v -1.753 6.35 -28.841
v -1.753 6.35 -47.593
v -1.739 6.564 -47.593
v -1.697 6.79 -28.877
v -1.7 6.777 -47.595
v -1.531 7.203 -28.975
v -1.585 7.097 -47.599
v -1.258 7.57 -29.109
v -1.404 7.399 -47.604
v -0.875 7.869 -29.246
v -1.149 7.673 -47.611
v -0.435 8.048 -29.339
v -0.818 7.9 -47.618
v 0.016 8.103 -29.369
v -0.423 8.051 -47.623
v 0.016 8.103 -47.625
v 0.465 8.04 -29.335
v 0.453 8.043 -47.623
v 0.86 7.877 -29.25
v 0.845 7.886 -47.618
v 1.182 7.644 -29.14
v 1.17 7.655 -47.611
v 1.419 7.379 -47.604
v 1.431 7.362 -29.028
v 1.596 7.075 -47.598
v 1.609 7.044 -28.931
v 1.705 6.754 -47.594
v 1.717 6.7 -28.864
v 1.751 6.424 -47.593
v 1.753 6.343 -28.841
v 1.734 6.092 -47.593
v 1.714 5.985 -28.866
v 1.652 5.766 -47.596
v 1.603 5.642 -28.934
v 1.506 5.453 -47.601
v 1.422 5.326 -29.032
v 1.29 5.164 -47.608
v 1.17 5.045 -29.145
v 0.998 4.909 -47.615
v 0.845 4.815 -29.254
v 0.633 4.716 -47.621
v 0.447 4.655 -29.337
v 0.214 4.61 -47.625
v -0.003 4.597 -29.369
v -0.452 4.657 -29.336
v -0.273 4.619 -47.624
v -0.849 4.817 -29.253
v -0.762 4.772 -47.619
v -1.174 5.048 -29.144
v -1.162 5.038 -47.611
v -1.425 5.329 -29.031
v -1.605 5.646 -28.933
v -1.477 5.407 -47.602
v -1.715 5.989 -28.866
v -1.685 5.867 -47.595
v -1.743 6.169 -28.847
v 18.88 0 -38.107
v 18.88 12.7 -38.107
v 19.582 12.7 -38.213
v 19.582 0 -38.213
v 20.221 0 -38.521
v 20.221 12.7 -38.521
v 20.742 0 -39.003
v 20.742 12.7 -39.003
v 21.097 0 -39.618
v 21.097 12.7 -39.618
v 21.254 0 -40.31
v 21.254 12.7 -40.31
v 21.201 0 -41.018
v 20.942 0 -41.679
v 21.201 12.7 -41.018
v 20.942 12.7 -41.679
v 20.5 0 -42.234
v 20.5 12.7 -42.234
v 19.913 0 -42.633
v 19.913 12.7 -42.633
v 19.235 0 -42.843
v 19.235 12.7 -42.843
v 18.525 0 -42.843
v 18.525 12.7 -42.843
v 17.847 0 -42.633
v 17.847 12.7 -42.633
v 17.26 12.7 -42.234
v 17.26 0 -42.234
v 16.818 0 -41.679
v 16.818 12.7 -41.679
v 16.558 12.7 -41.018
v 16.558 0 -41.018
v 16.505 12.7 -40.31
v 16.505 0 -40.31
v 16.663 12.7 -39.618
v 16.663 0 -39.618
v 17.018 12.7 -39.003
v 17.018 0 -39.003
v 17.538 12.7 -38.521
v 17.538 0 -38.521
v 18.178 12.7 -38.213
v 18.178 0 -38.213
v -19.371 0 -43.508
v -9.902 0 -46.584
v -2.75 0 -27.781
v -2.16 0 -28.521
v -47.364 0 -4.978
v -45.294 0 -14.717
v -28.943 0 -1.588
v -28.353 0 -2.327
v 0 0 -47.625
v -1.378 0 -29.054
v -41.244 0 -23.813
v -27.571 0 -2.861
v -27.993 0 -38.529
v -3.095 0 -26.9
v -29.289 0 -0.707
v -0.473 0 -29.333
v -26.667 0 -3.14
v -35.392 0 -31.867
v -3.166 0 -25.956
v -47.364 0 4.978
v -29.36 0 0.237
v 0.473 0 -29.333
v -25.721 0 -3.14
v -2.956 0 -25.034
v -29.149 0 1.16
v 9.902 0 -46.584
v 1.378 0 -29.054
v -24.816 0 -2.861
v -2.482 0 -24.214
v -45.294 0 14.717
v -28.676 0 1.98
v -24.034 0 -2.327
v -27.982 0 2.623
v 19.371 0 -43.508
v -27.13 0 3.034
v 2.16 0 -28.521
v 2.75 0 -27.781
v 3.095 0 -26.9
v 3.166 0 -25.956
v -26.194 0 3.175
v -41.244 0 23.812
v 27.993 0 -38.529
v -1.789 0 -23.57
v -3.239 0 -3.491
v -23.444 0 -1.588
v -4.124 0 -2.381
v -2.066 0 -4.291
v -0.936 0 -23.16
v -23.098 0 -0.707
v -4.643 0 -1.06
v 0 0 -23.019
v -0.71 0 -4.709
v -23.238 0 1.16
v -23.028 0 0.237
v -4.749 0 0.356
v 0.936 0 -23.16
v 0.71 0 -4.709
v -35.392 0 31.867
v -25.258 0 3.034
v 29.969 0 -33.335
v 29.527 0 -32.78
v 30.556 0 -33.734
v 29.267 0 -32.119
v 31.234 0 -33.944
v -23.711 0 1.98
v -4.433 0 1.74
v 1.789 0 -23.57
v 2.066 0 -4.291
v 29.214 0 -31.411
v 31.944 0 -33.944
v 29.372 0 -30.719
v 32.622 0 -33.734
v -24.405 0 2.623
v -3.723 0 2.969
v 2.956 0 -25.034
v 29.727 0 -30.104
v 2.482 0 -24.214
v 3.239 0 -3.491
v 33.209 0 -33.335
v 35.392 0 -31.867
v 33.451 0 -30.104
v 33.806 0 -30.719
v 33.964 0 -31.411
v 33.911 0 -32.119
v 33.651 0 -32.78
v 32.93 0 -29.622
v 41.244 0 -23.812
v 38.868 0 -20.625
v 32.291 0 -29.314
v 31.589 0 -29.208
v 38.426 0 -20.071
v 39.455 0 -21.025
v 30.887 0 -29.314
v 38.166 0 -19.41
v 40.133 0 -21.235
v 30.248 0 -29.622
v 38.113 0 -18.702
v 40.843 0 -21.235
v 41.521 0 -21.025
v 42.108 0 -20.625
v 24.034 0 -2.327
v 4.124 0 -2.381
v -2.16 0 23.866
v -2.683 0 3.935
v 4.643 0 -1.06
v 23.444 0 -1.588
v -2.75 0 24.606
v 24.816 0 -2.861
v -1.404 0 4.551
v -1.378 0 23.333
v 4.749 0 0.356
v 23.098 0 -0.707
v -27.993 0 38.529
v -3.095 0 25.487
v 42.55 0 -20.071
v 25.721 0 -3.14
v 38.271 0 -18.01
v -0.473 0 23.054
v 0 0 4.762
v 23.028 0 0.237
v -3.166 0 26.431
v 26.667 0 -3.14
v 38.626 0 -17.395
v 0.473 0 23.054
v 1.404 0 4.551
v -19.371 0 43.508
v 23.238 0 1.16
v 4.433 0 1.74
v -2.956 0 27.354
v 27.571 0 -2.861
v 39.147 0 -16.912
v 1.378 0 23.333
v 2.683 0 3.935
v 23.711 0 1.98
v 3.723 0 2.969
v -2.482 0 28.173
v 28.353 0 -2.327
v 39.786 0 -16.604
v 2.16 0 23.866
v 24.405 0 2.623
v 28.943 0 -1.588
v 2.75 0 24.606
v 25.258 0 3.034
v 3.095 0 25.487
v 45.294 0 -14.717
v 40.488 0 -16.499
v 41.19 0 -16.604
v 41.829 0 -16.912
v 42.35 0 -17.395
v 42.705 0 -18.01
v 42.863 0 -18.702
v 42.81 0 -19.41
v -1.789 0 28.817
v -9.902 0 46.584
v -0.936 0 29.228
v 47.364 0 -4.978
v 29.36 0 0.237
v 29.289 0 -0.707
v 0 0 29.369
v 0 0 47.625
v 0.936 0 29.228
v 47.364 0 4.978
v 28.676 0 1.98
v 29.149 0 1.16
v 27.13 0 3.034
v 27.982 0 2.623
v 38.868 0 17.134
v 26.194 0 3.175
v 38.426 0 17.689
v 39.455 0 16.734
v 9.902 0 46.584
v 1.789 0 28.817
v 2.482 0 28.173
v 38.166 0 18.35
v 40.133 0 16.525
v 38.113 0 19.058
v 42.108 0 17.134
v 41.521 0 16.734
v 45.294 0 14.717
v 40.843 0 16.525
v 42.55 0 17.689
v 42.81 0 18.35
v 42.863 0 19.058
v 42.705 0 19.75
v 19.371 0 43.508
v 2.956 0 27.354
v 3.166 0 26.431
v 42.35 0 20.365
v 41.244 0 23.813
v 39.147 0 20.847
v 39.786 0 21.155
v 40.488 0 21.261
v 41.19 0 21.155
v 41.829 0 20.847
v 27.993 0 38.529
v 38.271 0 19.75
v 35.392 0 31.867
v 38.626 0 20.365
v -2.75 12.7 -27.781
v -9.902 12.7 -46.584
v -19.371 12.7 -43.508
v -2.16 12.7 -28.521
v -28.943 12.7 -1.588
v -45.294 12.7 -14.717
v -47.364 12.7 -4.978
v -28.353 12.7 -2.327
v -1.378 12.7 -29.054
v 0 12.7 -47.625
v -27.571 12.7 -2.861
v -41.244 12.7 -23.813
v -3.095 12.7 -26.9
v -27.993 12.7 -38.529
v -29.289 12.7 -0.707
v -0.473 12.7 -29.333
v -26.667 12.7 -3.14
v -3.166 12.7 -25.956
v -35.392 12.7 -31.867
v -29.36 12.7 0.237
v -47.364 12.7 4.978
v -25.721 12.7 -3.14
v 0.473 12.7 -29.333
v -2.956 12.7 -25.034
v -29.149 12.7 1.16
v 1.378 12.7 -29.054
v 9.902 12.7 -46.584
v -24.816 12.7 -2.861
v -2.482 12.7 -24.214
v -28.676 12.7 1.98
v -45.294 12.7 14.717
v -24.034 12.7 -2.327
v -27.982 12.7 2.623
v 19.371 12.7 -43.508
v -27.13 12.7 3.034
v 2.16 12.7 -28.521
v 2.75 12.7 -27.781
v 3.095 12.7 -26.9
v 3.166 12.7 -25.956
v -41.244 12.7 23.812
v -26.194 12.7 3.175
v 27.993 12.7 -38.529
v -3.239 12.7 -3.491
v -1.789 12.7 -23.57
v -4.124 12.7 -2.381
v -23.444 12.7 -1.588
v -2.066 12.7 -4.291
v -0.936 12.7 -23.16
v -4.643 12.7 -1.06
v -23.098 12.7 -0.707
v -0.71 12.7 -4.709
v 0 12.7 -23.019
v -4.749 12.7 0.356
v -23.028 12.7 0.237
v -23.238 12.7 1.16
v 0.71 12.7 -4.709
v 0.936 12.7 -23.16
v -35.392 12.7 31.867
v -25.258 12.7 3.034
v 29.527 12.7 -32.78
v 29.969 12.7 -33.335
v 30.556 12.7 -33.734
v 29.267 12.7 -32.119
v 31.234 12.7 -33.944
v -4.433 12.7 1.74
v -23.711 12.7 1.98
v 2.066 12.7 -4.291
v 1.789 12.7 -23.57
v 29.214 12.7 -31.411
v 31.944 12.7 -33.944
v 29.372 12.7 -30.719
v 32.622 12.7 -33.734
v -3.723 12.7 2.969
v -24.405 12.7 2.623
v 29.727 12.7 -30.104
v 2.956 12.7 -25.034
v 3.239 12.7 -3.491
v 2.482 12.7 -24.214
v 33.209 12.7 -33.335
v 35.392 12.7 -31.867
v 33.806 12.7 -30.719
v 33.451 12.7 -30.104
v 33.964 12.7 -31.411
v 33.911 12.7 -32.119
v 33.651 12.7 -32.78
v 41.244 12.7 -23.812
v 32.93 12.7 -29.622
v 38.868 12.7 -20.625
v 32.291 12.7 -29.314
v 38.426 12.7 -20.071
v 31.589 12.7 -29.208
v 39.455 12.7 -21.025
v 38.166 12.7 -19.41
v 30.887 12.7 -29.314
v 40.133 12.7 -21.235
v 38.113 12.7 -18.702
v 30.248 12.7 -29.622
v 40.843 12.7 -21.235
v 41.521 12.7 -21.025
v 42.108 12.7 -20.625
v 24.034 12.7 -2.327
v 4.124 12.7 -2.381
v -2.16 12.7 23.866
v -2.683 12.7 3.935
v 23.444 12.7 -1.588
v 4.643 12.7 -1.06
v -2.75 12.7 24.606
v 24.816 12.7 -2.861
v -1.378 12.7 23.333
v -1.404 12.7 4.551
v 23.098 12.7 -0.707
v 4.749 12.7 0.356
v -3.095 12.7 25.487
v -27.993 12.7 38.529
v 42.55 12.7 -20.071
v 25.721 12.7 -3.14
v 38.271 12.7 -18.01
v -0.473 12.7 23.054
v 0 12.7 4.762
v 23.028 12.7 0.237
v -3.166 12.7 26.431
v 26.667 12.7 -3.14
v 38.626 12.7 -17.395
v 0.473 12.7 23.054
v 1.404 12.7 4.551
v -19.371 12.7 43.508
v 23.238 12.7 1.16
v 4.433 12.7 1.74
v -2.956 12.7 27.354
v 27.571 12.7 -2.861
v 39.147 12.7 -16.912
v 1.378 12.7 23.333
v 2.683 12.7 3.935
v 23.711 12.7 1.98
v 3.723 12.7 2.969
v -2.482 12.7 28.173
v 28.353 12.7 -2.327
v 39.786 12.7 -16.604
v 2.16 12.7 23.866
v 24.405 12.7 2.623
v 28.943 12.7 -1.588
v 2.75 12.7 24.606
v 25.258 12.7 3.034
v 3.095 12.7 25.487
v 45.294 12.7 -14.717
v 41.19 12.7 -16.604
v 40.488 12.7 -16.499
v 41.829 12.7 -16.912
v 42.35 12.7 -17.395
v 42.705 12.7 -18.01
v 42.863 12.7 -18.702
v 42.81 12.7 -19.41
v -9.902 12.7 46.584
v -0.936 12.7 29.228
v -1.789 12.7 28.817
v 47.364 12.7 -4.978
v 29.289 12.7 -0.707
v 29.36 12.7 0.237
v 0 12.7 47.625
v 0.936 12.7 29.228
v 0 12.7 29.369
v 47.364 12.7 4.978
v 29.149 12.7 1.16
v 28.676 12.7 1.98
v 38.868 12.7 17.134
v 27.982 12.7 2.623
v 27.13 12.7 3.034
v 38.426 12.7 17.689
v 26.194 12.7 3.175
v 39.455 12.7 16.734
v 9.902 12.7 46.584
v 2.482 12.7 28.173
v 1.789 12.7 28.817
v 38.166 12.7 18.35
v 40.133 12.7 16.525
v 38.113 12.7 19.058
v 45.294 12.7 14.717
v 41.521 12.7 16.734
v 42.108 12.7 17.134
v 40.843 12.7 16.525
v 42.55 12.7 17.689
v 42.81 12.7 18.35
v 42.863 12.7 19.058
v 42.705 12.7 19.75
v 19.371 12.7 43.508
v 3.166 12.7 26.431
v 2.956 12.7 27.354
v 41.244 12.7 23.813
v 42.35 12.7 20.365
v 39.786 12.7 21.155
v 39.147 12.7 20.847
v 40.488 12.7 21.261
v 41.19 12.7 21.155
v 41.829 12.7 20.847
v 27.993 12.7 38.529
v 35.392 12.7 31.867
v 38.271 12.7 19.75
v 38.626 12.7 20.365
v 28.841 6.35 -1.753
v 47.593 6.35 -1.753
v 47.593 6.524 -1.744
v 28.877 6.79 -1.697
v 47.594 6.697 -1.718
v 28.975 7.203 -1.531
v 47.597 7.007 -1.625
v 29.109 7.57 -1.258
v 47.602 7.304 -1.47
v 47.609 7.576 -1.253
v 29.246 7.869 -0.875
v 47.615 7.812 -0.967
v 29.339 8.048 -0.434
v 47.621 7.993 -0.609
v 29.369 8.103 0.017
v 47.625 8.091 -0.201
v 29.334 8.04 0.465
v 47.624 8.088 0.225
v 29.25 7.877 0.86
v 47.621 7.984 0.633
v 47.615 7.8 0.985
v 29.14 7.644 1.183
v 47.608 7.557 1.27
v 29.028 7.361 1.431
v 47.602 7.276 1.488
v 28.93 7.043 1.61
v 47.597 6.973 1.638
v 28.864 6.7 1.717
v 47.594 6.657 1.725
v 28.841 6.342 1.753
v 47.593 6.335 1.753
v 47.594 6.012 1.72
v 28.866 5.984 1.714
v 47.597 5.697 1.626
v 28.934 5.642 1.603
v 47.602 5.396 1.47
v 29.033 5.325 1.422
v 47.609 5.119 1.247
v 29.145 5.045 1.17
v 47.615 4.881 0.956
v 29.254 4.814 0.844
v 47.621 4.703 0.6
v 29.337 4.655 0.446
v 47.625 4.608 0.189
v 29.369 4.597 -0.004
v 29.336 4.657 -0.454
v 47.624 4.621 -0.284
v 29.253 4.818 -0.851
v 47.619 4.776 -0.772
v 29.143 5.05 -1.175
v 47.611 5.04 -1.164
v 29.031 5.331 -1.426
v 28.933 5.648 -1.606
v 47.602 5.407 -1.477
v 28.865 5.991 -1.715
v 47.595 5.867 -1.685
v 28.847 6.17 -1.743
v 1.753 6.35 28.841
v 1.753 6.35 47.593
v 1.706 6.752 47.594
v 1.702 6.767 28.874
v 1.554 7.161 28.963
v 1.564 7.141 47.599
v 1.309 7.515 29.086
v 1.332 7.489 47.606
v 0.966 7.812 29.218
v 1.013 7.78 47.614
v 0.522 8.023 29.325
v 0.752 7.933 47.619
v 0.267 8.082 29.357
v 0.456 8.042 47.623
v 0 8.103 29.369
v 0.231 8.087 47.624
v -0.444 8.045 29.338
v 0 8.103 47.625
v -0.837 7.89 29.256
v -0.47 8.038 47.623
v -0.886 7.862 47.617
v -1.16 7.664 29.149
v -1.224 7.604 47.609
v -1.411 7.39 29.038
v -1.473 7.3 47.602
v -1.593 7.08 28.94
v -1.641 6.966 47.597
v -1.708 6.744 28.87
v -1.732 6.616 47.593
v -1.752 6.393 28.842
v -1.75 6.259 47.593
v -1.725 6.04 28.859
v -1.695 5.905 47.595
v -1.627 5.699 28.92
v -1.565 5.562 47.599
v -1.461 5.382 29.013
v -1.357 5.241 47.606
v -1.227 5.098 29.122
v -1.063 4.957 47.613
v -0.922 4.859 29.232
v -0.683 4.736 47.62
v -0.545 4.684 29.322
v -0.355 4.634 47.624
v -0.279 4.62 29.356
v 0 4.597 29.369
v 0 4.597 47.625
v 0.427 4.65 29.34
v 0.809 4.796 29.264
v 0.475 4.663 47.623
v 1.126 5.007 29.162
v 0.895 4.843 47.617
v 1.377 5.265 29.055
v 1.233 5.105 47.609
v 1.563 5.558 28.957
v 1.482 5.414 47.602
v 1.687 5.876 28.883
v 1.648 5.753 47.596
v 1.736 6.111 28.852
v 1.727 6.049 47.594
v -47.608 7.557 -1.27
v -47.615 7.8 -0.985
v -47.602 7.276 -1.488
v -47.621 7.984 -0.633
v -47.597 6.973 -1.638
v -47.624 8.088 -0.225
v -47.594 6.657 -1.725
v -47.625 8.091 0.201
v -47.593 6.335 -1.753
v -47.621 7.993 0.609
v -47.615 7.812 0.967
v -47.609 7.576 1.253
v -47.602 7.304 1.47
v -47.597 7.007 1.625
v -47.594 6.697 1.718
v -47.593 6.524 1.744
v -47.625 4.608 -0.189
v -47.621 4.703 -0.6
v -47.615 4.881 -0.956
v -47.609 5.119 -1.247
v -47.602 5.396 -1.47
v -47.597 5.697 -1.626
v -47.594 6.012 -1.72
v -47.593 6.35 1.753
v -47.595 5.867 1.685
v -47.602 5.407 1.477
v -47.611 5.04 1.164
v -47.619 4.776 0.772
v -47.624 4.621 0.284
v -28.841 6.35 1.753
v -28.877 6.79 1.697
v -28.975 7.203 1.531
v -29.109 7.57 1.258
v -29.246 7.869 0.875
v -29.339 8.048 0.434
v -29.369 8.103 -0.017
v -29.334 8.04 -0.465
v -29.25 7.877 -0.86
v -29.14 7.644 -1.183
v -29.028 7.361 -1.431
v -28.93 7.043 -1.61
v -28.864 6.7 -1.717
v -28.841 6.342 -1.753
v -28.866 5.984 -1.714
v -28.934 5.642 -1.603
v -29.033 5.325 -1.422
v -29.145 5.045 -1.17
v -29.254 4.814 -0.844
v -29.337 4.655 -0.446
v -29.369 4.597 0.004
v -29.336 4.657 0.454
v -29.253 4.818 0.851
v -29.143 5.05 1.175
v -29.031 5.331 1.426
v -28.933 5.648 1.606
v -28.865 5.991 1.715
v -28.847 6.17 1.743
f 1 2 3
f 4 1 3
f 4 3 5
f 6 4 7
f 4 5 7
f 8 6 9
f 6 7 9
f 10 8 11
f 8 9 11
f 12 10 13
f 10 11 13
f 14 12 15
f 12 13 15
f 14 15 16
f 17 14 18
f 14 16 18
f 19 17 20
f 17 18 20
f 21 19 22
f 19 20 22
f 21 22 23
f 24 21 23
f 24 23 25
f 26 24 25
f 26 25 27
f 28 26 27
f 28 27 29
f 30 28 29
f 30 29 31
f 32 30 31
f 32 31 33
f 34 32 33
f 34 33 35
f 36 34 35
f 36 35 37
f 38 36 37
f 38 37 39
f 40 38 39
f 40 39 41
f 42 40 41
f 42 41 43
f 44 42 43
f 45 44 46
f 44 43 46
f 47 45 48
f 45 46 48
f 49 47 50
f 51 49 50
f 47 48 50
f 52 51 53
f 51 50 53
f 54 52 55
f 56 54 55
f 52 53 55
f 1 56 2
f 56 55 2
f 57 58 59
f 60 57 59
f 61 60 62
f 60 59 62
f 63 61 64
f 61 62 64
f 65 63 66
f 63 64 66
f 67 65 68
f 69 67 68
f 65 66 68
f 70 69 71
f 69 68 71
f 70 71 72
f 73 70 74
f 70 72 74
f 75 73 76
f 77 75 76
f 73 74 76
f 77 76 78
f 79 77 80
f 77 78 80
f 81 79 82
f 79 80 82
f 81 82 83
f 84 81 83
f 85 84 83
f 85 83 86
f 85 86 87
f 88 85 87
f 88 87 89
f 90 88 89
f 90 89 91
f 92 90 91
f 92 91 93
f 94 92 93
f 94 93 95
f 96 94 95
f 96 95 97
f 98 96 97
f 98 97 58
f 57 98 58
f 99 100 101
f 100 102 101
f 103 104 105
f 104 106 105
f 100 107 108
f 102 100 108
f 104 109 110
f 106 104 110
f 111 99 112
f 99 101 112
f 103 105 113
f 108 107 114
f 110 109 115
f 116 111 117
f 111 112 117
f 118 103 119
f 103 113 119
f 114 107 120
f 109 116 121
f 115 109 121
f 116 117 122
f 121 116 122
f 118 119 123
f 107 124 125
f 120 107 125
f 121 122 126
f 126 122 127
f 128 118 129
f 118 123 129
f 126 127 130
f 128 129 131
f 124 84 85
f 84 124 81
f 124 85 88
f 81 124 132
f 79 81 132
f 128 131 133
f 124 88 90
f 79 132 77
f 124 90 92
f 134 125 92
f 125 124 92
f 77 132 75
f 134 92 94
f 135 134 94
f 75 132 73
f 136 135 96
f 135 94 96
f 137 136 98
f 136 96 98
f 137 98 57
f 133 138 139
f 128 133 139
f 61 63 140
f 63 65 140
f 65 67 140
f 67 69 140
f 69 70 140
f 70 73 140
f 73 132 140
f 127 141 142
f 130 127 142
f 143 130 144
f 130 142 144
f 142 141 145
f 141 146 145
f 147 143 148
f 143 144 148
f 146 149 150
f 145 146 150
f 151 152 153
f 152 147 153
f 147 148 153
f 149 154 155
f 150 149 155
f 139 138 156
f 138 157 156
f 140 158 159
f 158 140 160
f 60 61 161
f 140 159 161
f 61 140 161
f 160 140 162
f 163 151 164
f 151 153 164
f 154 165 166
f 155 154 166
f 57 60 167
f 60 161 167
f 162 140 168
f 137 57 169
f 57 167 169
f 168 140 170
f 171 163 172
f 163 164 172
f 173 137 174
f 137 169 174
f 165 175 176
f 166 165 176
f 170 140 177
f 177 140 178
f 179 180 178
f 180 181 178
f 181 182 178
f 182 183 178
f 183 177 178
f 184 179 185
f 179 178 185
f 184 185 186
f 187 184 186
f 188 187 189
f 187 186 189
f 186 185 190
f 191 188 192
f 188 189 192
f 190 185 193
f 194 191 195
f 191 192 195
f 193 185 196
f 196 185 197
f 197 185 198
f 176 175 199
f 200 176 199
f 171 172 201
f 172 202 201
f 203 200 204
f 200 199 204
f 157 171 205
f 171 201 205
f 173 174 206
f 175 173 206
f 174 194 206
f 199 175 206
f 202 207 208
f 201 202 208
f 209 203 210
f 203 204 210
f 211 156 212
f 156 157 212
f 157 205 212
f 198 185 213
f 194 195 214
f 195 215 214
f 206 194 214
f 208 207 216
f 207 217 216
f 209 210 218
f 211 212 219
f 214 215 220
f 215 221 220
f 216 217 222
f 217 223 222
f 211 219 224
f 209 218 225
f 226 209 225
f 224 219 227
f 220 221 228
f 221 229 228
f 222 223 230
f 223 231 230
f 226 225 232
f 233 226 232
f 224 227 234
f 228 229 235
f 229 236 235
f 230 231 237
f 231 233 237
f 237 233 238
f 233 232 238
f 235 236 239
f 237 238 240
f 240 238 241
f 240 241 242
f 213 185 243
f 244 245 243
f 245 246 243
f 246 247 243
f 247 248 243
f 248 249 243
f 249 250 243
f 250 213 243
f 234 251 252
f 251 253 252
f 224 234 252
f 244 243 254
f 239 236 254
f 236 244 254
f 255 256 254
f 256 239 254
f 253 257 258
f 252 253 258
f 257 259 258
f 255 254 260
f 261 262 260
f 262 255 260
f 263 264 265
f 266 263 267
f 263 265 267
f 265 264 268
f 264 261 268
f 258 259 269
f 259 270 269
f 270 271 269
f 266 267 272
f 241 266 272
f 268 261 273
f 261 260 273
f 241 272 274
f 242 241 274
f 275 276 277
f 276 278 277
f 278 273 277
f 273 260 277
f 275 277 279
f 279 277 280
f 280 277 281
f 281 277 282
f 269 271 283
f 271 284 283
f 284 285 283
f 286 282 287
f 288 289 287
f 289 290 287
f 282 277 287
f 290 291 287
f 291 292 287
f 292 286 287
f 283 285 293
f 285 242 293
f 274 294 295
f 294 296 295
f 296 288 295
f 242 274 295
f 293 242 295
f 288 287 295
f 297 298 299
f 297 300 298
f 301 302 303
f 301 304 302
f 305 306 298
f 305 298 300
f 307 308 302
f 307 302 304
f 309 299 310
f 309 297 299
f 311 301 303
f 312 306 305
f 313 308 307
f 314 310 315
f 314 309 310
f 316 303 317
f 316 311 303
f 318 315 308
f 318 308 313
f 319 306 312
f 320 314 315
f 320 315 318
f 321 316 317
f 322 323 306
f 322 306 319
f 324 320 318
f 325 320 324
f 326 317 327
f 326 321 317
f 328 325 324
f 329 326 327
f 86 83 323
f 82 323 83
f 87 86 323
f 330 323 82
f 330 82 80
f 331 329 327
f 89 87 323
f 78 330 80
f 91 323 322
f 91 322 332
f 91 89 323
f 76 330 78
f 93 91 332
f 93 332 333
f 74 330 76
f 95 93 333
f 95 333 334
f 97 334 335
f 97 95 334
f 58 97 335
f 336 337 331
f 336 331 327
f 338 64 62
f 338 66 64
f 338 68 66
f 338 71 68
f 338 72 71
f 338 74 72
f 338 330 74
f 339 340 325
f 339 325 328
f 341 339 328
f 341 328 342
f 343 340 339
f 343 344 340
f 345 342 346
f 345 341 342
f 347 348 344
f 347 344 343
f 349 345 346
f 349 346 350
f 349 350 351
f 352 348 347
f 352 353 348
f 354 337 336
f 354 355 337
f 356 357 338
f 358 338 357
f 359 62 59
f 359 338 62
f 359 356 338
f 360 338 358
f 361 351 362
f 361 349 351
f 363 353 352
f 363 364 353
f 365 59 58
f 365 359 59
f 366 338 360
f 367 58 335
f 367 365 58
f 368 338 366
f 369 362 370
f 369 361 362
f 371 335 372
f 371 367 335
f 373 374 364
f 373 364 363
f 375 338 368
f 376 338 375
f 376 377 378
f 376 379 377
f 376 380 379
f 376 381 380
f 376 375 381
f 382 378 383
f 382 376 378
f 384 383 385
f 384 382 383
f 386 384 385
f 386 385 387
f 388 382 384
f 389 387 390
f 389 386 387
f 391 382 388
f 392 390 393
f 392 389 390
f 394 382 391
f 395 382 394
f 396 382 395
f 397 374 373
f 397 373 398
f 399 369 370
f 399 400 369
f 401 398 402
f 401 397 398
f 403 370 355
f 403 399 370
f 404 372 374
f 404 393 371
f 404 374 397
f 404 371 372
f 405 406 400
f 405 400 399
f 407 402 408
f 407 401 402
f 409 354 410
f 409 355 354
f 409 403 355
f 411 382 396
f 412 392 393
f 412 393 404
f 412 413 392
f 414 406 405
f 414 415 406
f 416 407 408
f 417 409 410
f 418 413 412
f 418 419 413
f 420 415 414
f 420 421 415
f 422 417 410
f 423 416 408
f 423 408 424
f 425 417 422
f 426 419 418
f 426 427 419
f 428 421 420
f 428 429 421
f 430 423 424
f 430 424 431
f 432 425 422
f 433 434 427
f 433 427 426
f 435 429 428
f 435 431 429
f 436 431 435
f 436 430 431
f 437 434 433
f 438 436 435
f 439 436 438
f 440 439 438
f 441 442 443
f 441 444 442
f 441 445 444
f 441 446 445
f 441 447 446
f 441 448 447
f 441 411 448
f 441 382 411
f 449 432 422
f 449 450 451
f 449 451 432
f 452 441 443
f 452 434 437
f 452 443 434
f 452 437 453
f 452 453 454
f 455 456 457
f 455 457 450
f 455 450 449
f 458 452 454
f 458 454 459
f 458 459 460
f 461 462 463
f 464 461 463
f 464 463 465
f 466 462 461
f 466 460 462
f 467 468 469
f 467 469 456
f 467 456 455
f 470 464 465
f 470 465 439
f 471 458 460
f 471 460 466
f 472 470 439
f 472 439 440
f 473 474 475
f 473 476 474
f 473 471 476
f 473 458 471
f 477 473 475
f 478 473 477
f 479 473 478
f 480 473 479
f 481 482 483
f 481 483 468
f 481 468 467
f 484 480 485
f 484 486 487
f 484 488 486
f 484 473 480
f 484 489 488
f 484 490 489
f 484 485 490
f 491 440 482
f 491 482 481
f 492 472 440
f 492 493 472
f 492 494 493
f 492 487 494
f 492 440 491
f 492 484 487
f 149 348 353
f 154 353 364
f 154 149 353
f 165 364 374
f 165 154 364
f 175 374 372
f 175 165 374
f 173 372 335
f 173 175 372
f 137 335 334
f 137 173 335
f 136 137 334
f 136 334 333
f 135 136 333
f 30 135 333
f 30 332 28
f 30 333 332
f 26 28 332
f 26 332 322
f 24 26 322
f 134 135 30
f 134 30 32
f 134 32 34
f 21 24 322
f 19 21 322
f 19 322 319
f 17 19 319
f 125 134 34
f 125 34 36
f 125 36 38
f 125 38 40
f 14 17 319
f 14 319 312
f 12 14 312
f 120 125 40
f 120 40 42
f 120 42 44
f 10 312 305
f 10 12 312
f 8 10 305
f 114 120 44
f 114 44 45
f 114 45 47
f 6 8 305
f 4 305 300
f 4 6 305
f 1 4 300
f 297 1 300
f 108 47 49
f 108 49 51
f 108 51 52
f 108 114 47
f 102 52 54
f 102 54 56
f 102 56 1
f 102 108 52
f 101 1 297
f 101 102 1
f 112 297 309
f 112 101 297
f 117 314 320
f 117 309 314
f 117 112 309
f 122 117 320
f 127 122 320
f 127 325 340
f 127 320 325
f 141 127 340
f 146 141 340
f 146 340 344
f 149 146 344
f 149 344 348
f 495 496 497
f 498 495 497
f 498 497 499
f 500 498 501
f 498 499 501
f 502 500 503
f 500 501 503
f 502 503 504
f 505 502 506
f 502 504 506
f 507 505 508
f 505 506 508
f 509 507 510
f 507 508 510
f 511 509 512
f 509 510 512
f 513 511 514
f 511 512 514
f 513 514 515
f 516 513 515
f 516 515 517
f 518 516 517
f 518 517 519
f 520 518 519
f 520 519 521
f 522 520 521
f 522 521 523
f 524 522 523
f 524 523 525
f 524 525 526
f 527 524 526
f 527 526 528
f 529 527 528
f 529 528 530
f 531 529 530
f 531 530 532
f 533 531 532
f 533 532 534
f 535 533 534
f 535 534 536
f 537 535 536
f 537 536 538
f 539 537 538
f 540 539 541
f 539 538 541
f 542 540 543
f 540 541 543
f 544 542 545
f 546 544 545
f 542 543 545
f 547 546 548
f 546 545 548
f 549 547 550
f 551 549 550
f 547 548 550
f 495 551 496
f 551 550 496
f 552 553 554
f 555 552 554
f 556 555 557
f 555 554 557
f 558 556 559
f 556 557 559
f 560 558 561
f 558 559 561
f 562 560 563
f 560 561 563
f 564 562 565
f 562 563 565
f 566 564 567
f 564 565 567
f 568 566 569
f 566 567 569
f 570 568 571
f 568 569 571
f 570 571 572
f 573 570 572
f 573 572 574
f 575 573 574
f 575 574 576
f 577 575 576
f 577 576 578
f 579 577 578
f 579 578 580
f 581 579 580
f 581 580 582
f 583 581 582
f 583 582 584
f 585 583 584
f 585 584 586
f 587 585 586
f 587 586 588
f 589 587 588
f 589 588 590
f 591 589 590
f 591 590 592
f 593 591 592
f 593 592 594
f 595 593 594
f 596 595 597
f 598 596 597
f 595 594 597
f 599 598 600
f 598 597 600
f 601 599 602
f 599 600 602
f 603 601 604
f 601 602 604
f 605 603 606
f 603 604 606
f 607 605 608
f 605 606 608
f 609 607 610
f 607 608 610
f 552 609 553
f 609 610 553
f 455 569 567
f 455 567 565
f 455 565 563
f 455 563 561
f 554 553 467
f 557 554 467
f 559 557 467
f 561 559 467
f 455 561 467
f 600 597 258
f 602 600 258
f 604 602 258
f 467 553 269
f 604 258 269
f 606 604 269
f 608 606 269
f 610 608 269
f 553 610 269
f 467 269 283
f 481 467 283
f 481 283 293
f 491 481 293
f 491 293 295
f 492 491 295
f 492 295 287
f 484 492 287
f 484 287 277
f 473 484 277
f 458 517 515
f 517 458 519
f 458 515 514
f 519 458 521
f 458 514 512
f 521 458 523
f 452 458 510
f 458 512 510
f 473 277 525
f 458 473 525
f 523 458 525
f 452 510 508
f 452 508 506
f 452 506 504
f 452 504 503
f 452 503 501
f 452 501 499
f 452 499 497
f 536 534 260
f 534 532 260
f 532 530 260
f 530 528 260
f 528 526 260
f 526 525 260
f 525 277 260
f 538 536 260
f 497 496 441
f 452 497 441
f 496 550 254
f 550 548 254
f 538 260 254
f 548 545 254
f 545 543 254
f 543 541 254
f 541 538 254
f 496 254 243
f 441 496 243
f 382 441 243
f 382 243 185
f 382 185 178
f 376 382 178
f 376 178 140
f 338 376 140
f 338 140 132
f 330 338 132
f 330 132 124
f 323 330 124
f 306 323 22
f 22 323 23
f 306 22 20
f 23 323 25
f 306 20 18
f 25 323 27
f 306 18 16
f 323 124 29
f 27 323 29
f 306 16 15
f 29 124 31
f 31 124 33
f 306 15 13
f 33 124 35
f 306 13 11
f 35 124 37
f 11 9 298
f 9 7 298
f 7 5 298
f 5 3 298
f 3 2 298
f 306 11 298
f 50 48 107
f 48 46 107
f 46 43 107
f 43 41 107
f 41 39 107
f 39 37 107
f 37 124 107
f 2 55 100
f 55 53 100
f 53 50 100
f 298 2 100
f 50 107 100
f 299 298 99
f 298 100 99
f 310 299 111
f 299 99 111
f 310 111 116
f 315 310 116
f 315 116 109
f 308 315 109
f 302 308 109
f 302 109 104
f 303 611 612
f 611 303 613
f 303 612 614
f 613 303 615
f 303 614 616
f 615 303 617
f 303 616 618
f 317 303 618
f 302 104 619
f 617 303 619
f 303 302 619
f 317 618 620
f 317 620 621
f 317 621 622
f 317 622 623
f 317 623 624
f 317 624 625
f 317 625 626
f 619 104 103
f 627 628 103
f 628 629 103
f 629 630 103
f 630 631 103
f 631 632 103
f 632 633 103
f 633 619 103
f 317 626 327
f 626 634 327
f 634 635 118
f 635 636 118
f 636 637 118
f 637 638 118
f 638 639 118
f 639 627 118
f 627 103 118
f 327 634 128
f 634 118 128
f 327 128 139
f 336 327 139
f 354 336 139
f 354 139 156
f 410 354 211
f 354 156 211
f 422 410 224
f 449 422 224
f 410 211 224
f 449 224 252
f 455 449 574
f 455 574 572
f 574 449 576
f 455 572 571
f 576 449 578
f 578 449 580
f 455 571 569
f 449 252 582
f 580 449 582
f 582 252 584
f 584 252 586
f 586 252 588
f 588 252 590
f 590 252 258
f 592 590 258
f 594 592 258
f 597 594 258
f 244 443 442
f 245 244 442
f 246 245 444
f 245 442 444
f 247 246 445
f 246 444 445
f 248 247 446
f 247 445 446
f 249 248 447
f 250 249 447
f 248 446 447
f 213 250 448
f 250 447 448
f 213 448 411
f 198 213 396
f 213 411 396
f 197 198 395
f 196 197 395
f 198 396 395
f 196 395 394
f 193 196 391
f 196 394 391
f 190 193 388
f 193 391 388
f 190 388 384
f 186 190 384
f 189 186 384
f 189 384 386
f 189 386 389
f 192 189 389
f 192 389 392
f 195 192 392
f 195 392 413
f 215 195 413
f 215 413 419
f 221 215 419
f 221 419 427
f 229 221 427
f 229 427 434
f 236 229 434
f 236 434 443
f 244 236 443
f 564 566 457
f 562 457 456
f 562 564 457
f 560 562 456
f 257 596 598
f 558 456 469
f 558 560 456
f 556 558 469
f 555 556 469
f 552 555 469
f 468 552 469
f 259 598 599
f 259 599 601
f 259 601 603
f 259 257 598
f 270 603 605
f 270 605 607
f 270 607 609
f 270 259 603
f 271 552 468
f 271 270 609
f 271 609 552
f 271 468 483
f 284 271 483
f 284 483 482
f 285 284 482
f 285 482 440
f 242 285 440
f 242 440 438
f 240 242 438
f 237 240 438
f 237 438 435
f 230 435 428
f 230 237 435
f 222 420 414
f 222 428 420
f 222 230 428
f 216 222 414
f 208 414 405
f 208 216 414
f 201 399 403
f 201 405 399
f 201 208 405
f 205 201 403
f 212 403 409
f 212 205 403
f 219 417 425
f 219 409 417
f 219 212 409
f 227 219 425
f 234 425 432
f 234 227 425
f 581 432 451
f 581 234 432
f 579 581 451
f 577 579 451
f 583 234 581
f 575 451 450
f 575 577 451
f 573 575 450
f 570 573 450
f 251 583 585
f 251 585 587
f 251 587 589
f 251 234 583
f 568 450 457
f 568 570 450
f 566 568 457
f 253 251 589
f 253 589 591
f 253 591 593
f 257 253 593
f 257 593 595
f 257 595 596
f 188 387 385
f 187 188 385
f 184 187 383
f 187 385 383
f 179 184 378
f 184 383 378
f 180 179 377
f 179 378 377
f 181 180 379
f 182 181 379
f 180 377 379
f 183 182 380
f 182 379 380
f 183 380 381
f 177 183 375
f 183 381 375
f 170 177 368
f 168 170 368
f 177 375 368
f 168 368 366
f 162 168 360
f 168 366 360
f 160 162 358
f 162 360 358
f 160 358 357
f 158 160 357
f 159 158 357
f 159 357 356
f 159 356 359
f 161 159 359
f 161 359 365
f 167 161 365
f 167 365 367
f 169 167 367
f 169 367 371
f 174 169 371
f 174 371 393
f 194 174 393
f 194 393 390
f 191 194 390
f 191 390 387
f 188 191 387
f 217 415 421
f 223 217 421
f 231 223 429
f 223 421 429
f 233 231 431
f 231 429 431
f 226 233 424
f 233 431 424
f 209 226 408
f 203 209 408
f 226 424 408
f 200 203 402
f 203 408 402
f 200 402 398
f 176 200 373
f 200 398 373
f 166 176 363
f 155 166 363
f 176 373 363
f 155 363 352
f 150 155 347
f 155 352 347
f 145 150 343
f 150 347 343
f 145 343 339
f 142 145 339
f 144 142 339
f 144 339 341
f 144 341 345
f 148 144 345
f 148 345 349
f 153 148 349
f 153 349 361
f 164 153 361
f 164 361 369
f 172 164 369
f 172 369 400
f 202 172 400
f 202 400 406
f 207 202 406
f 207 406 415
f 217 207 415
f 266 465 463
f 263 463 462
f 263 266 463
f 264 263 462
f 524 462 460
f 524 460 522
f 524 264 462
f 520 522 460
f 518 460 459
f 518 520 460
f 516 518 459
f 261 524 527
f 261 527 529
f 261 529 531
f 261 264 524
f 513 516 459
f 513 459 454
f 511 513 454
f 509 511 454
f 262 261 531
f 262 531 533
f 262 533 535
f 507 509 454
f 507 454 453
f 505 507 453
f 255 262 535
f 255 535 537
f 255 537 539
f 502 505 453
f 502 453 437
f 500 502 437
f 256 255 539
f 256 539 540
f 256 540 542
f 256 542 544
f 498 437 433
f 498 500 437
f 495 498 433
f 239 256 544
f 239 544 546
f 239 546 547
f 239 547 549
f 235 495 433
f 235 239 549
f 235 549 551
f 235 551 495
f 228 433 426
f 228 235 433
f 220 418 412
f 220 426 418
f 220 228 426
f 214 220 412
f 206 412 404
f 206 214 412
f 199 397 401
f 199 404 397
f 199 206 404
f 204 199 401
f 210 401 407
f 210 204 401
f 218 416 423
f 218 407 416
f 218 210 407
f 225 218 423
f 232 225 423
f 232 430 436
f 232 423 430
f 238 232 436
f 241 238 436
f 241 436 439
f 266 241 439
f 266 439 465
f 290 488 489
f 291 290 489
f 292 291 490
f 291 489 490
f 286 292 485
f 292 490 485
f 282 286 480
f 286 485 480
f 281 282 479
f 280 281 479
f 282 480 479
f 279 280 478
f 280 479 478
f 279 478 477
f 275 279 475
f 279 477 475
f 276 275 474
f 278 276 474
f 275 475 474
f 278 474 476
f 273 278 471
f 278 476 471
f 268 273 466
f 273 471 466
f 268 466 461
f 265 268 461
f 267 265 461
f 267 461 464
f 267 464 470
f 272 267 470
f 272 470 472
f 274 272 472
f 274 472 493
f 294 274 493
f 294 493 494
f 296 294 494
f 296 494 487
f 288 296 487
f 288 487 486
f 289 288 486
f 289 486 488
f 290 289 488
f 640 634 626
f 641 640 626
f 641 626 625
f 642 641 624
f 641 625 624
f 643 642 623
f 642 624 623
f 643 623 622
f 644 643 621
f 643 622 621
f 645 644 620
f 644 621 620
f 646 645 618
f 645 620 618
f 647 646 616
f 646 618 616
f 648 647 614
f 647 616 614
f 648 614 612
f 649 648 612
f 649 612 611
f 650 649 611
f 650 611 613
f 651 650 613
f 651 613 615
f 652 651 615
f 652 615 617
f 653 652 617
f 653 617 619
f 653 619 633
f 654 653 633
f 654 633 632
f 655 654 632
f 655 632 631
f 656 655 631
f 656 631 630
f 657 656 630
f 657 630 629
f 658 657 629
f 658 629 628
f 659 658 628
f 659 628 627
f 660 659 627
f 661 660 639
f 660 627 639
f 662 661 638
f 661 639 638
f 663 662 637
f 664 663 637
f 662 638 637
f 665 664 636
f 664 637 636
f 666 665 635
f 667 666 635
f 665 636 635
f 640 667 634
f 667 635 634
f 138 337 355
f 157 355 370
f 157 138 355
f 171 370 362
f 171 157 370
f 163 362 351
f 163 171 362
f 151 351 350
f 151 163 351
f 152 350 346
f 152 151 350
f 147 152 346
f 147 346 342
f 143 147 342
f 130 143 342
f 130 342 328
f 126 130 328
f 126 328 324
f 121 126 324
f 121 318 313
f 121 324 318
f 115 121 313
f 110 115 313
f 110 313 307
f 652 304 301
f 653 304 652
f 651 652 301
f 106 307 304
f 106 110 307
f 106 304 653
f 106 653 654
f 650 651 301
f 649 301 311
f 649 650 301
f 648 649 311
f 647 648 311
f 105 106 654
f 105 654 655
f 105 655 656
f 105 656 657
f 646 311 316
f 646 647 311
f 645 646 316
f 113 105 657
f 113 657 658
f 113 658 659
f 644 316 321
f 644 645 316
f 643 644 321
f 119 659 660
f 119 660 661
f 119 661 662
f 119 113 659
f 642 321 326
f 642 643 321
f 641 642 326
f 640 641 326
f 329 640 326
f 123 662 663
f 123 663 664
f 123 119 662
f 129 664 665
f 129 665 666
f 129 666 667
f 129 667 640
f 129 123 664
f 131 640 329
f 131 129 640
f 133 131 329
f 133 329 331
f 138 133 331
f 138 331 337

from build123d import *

# Parameters (mm, degrees)
SKETCH1_R           = 47.625
BOSS_EXTRUDE1_DEPTH = 12.7
SKETCH6_R           = 1.7526
CUT_EXTRUDE3_DEPTH  = 19.05
CIRPATTERN4_COUNT   = 4
SKETCH7_R           = 3.175
CUT_EXTRUDE6_DEPTH  = 69.538830402
SKETCH8_R           = 4.7625
CUT_EXTRUDE7_DEPTH  = 69.538830402
SKETCH11_R          = 2.38125
CUT_EXTRUDE8_DEPTH  = 69.538830402


with BuildPart() as part:
    # Sketch1 → Boss-Extrude1 (new body)
    with BuildSketch(Plane(origin=(0, 0, 0), x_dir=(1, 0, 0), z_dir=(0, 1, 0))):
        with Locations(Location((0, 0, 0), (0, 0, 270))):
            Circle(SKETCH1_R)
    extrude(amount=BOSS_EXTRUDE1_DEPTH)

    # Sketch6 → Cut-Extrude3 (cut)
    with BuildSketch(Plane(origin=(0, 0, -47.625), x_dir=(0, -1, 0), z_dir=(0, 0, -1))):
        with Locations(Location((-6.35, 0, 0), (0, 0, 90))):
            Circle(SKETCH6_R)
    cut_extrude3 = extrude(amount=-CUT_EXTRUDE3_DEPTH, mode=Mode.SUBTRACT)

    # CirPattern4: Cut-Extrude3 ×4 about axis
    cirpattern4_axis = Axis((0, 0, 0), (0, 1, 0))
    for i in range(1, CIRPATTERN4_COUNT):
        add(cut_extrude3.rotate(cirpattern4_axis, i * 360 / CIRPATTERN4_COUNT), mode=Mode.SUBTRACT)

    # Sketch7 → Cut-Extrude6 (cut, through all)
    with BuildSketch(Plane(origin=(0, 0, 0), x_dir=(1, 0, 0), z_dir=(0, 1, 0))):
        with Locations(Location((-26.19375, 0, 0), (0, 0, 270))):
            Circle(SKETCH7_R)
        with Locations(Location((26.19375, 0, 0), (0, 0, 270))):
            Circle(SKETCH7_R)
        with Locations(Location((0, 26.19375, 0), (0, 0, 270))):
            Circle(SKETCH7_R)
        with Locations(Location((0, -26.19375, 0), (0, 0, 270))):
            Circle(SKETCH7_R)
    extrude(amount=CUT_EXTRUDE6_DEPTH, mode=Mode.SUBTRACT)

    # Sketch8 → Cut-Extrude7 (cut, through all)
    with BuildSketch(Plane(origin=(0, 12.7, 0), x_dir=(1, 0, 0), z_dir=(0, 1, 0))):
        with Locations(Location((0, 0, 0), (0, 0, 270))):
            Circle(SKETCH8_R)
    extrude(amount=-CUT_EXTRUDE7_DEPTH, mode=Mode.SUBTRACT)

    # Sketch11 → Cut-Extrude8 (cut, through all)
    with BuildSketch(Plane(origin=(0, 12.7, 0), x_dir=(1, 0, 0), z_dir=(0, 1, 0))):
        with Locations(Location((31.589006405, 31.589006405, 0), (0, 0, 270))):
            Circle(SKETCH11_R)
        with Locations(Location((40.488032715, 18.879879719, 0), (0, 0, 270))):
            Circle(SKETCH11_R)
        with Locations(Location((18.879879719, 40.488032715, 0), (0, 0, 270))):
            Circle(SKETCH11_R)
        with Locations(Location((40.488032715, -18.879879719, 0), (0, 0, 270))):
            Circle(SKETCH11_R)
    extrude(amount=-CUT_EXTRUDE8_DEPTH, mode=Mode.SUBTRACT)


solid = part.part
